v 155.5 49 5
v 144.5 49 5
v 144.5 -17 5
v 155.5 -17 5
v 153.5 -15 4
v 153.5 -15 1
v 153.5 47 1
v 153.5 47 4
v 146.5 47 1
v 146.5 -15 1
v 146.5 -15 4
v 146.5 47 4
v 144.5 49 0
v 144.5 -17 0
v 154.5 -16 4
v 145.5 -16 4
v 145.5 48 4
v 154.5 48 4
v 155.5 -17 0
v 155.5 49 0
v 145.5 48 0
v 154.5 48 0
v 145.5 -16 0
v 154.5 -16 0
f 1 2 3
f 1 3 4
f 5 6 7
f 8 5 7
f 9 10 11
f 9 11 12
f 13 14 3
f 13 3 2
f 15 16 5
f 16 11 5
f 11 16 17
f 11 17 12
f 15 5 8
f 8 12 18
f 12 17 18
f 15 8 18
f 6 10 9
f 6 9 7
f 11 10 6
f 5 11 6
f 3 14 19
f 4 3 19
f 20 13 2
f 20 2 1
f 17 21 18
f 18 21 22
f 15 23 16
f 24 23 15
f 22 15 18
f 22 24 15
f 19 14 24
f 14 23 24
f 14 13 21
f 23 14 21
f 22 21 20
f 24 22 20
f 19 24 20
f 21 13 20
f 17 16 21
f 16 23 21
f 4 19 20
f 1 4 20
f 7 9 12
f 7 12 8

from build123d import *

# Parameters (mm, degrees)
SKETCH083_W   = 9
SKETCH083_H   = 64
PAD058_DEPTH  = 1
SKETCH084_W   = 9
SKETCH084_H   = 64
SKETCH084_W_2 = 7
SKETCH084_H_2 = 62
PAD059_DEPTH  = 3
BOX003_W      = 11
BOX003_H      = 66
BOX003_DEPTH  = 5


with BuildPart() as sidemold001:
    # Sketch083 → Pad058 (new body)
    with BuildSketch(Plane.XY):
        Rectangle(SKETCH083_W, SKETCH083_H)
    extrude(amount=PAD058_DEPTH)

    # Sketch084 (on Face6 of Pad058) → Pad059 (join)
    with BuildSketch(Plane.XY.offset(1)):
        Rectangle(SKETCH084_W, SKETCH084_H)
        Rectangle(SKETCH084_W_2, SKETCH084_H_2, mode=Mode.SUBTRACT)
    extrude(amount=PAD059_DEPTH)


with BuildPart() as sidemold001_1:
    # Body026 placement: moved
    add(sidemold001.part.moved(Location((150, 35, 0))))


with BuildPart() as long_side_mold:
    # Box003 → Box003 (new body)
    with BuildSketch(Plane(origin=(144.5, 2, 0), x_dir=(1, 0, 0), z_dir=(0, 0, 1))):
        with Locations((5.5, 33)):
            Rectangle(BOX003_W, BOX003_H)
    extrude(amount=BOX003_DEPTH)

    # Cut003: cut SideMold001
    add(sidemold001_1.part, mode=Mode.SUBTRACT)


with BuildPart() as long_side_mold_1:
    # Cut003 placement: moved
    add(long_side_mold.part.moved(Location((0, -19, 0))))


solid = long_side_mold_1.part
